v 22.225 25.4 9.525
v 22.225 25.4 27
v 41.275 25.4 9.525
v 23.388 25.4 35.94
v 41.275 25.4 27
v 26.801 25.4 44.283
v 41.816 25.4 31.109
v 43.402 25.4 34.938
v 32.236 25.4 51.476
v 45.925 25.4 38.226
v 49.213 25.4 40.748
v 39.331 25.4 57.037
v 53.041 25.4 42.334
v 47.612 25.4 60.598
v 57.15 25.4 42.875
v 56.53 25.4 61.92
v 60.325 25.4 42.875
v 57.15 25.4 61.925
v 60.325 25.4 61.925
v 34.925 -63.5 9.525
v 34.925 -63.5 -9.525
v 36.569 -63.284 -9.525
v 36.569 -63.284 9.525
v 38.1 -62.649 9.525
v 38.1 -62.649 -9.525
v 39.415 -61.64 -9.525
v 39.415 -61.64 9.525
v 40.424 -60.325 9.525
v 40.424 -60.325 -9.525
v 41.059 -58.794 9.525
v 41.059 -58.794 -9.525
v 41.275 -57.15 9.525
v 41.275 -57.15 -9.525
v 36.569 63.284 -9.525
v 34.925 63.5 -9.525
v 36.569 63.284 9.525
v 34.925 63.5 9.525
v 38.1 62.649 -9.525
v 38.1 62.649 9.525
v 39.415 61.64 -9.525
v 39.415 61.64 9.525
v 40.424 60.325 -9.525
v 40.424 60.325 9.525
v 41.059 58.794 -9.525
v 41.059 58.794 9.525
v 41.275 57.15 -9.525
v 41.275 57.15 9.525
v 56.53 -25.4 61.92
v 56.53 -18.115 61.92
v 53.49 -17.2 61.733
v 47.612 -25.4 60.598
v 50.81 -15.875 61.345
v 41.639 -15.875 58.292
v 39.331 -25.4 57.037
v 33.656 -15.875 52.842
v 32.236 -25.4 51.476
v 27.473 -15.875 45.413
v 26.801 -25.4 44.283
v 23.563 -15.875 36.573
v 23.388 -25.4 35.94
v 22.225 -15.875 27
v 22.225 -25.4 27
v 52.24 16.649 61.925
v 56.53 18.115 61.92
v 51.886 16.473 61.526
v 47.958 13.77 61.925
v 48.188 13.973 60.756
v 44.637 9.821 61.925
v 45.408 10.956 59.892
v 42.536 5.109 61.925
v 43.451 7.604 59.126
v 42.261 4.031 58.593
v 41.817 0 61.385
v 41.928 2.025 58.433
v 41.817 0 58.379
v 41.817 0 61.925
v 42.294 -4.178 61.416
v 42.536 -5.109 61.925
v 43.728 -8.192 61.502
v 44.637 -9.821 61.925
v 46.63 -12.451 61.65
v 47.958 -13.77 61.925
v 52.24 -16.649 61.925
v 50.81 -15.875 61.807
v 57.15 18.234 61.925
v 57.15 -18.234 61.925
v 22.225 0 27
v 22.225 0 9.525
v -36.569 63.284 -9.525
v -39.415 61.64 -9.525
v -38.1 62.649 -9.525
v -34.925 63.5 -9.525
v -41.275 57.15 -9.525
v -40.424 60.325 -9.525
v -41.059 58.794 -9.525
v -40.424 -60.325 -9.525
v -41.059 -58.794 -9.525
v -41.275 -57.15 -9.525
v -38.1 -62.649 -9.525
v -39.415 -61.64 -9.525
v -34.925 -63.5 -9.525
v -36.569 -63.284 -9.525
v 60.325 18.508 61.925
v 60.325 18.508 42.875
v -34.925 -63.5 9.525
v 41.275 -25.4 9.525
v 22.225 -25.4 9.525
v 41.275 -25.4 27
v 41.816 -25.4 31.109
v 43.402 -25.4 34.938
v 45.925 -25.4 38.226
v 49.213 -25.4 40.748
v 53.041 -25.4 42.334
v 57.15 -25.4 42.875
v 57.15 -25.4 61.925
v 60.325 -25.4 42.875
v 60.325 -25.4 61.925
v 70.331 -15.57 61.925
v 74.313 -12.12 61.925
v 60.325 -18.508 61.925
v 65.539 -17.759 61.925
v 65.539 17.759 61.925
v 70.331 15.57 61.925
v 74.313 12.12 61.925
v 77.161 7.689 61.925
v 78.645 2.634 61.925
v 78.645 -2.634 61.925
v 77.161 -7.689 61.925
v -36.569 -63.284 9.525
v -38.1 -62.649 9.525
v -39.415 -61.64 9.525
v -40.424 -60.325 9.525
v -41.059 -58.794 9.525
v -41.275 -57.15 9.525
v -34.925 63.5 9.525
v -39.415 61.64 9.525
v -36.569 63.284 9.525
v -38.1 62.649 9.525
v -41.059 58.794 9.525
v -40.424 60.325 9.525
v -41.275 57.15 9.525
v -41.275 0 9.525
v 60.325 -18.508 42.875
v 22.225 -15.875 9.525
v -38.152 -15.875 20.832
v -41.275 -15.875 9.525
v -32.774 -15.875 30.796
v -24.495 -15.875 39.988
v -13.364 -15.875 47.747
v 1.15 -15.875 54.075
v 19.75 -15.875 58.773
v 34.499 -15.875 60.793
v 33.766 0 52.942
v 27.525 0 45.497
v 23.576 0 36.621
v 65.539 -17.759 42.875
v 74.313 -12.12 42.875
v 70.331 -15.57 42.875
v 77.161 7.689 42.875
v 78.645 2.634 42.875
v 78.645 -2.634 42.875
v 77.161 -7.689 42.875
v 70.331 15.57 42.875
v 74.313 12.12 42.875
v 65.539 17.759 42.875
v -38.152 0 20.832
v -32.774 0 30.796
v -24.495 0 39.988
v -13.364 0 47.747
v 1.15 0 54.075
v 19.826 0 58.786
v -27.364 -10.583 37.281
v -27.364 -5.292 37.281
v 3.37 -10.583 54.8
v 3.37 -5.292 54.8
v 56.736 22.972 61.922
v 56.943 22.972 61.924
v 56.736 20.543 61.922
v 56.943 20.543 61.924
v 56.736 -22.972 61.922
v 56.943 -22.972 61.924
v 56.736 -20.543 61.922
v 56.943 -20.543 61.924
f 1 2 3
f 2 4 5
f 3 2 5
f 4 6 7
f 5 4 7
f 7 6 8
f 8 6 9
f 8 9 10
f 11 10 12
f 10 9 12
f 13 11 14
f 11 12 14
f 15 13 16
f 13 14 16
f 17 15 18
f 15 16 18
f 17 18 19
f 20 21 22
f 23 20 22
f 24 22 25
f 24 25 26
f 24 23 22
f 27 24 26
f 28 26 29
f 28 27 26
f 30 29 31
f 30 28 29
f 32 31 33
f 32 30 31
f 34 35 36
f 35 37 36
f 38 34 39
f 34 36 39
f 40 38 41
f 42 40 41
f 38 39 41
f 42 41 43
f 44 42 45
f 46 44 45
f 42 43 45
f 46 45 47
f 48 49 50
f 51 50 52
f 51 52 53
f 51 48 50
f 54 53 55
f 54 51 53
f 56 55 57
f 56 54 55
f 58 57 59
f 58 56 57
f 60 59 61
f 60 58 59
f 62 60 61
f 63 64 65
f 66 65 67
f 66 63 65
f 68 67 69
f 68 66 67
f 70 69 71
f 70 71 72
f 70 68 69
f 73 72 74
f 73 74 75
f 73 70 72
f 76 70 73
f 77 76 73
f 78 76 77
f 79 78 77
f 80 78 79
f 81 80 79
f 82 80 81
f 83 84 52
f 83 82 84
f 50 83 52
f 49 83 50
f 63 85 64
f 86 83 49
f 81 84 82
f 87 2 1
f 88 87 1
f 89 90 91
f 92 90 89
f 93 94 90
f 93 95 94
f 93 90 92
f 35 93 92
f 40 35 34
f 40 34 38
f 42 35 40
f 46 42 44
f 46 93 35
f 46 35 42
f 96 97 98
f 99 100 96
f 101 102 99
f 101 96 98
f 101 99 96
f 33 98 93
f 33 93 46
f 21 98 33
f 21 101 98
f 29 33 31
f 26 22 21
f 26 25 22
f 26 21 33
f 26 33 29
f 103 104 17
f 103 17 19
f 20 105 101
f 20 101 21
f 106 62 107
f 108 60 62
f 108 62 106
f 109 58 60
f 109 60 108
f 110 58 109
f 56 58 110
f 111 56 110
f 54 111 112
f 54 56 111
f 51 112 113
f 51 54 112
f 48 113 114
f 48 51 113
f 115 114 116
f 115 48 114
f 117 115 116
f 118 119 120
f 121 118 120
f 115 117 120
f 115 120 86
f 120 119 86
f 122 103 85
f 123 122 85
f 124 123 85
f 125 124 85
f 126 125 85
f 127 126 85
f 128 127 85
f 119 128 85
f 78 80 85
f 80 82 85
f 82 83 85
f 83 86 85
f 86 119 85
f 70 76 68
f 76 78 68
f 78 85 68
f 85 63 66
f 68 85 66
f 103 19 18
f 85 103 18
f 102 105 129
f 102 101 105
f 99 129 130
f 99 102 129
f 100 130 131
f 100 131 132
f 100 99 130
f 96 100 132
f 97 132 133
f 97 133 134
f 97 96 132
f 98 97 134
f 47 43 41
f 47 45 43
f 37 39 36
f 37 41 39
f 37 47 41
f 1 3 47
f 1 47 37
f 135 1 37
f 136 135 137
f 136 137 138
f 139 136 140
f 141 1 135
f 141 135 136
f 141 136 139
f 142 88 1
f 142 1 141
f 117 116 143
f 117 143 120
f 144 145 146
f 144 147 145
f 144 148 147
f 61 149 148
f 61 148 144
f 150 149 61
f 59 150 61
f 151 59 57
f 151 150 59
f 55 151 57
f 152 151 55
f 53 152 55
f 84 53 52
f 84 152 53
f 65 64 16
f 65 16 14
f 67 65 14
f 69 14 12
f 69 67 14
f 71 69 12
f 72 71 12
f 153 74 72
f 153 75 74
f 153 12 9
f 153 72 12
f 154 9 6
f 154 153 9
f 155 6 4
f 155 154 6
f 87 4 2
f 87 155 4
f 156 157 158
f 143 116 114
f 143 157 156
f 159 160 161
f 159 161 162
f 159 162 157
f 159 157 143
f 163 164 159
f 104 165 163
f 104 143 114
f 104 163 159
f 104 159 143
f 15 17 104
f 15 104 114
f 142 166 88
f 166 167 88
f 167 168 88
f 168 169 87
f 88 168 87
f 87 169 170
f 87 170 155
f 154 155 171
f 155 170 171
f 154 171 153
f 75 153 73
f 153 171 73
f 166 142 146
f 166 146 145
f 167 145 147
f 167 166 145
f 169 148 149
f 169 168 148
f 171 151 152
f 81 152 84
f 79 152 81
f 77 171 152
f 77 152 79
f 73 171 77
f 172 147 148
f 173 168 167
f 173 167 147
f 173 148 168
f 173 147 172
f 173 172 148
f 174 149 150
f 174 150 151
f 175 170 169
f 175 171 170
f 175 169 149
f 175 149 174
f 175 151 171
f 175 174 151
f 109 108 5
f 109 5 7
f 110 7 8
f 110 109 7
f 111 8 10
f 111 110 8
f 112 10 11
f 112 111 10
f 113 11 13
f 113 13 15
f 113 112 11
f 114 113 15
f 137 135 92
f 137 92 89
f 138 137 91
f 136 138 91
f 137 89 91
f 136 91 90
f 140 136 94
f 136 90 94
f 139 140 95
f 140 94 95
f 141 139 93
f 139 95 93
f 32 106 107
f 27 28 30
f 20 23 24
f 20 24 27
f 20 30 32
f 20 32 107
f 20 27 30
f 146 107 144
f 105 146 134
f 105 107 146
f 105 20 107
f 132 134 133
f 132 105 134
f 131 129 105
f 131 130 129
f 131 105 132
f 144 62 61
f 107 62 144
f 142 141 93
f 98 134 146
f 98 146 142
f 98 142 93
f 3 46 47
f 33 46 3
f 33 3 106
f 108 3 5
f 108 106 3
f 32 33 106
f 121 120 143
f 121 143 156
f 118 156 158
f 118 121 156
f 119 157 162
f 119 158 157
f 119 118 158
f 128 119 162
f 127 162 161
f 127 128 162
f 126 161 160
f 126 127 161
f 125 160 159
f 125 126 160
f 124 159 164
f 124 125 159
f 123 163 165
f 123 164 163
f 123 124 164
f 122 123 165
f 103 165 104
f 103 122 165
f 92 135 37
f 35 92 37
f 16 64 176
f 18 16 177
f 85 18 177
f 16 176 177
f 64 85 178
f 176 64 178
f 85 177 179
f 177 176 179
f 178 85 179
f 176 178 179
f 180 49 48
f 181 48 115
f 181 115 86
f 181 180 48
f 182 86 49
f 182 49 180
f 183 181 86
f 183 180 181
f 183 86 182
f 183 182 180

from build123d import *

# Parameters (mm, degrees)
F1_DEPTH = 63.5
F2_DEPTH = 25.4
F3_DEPTH = 15.875
F0_W     = 18.50829
F0_H     = 19.05
F5_R     = 6.35


with BuildPart() as f1:
    # F0 (on Front) → F1 (new body, symmetric)
    with BuildSketch(Plane.XZ):
        Polygon((41.275, -9.525), (41.275, 9.525), (22.225, 9.525), (-41.275, 9.525), (-41.275, -9.525), align=None)
    extrude(amount=F1_DEPTH, both=True)

    # F0 (on Front) → F2 (join, symmetric)
    with BuildSketch(Plane.XZ):
        with BuildLine():
            Line((22.225, 9.525), (41.275, 9.525))
            Line((41.275, 9.525), (41.275, 27.0002))
            ThreePointArc((41.275, 27.0002), (45.92468, 38.22552), (57.15, 42.8752))
            Line((57.15, 42.8752), (60.325, 42.8752))
            Line((60.325, 42.8752), (60.325, 61.9252))
            Line((60.325, 61.9252), (57.15, 61.9252))
            add(Edge.make_bspline(
                [(56.529617, 61.91969), (56.73609, 61.921736), (56.942884, 61.923573), (57.15, 61.9252)],
                knots=[111.11806, 111.11806, 111.11806, 111.11806, 111.504536, 111.504536, 111.504536, 111.504536], degree=3))
            ThreePointArc((56.529617, 61.91969), (32.235922, 51.475583), (22.225, 27.0002))
            Line((22.225, 27.0002), (22.225, 9.525))
        make_face()
    extrude(amount=F2_DEPTH, both=True)

    # F0 (on Front) → F3 (join)
    with BuildSketch(Plane.XZ):
        with BuildLine():
            Line((-41.275, 9.525), (22.225, 9.525))
            Line((22.225, 9.525), (22.225, 27.0002))
            ThreePointArc((22.225, 27.0002), (32.235922, 51.475583), (56.529617, 61.91969))
            add(Edge.make_bspline(
                [(-41.275, 9.525), (-35.629907, 43.413288), (-2.834722, 61.331295), (56.529617, 61.91969)],
                knots=[0, 0, 0, 0, 111.11806, 111.11806, 111.11806, 111.11806], degree=3))
        make_face()
    extrude(amount=F3_DEPTH)

    # F0 (on Front) → F4 (revolve)
    with BuildSketch(Plane.XZ):
        with Locations((69.579145, 52.4002)):
            Rectangle(F0_W, F0_H)
    revolve(axis=Axis((60.325, 0, 52.3875), (0, 0, 1)))

    # F5
    f5_edges = [f1.edges().sort_by_distance(p)[0] for p in [
        (41.275, -63.5, 0),
        (-41.275, -63.5, 0),
        (41.275, 63.5, 0),
        (-41.275, 63.5, 0),
    ]]
    fillet(f5_edges, radius=F5_R)


solid = f1.part
